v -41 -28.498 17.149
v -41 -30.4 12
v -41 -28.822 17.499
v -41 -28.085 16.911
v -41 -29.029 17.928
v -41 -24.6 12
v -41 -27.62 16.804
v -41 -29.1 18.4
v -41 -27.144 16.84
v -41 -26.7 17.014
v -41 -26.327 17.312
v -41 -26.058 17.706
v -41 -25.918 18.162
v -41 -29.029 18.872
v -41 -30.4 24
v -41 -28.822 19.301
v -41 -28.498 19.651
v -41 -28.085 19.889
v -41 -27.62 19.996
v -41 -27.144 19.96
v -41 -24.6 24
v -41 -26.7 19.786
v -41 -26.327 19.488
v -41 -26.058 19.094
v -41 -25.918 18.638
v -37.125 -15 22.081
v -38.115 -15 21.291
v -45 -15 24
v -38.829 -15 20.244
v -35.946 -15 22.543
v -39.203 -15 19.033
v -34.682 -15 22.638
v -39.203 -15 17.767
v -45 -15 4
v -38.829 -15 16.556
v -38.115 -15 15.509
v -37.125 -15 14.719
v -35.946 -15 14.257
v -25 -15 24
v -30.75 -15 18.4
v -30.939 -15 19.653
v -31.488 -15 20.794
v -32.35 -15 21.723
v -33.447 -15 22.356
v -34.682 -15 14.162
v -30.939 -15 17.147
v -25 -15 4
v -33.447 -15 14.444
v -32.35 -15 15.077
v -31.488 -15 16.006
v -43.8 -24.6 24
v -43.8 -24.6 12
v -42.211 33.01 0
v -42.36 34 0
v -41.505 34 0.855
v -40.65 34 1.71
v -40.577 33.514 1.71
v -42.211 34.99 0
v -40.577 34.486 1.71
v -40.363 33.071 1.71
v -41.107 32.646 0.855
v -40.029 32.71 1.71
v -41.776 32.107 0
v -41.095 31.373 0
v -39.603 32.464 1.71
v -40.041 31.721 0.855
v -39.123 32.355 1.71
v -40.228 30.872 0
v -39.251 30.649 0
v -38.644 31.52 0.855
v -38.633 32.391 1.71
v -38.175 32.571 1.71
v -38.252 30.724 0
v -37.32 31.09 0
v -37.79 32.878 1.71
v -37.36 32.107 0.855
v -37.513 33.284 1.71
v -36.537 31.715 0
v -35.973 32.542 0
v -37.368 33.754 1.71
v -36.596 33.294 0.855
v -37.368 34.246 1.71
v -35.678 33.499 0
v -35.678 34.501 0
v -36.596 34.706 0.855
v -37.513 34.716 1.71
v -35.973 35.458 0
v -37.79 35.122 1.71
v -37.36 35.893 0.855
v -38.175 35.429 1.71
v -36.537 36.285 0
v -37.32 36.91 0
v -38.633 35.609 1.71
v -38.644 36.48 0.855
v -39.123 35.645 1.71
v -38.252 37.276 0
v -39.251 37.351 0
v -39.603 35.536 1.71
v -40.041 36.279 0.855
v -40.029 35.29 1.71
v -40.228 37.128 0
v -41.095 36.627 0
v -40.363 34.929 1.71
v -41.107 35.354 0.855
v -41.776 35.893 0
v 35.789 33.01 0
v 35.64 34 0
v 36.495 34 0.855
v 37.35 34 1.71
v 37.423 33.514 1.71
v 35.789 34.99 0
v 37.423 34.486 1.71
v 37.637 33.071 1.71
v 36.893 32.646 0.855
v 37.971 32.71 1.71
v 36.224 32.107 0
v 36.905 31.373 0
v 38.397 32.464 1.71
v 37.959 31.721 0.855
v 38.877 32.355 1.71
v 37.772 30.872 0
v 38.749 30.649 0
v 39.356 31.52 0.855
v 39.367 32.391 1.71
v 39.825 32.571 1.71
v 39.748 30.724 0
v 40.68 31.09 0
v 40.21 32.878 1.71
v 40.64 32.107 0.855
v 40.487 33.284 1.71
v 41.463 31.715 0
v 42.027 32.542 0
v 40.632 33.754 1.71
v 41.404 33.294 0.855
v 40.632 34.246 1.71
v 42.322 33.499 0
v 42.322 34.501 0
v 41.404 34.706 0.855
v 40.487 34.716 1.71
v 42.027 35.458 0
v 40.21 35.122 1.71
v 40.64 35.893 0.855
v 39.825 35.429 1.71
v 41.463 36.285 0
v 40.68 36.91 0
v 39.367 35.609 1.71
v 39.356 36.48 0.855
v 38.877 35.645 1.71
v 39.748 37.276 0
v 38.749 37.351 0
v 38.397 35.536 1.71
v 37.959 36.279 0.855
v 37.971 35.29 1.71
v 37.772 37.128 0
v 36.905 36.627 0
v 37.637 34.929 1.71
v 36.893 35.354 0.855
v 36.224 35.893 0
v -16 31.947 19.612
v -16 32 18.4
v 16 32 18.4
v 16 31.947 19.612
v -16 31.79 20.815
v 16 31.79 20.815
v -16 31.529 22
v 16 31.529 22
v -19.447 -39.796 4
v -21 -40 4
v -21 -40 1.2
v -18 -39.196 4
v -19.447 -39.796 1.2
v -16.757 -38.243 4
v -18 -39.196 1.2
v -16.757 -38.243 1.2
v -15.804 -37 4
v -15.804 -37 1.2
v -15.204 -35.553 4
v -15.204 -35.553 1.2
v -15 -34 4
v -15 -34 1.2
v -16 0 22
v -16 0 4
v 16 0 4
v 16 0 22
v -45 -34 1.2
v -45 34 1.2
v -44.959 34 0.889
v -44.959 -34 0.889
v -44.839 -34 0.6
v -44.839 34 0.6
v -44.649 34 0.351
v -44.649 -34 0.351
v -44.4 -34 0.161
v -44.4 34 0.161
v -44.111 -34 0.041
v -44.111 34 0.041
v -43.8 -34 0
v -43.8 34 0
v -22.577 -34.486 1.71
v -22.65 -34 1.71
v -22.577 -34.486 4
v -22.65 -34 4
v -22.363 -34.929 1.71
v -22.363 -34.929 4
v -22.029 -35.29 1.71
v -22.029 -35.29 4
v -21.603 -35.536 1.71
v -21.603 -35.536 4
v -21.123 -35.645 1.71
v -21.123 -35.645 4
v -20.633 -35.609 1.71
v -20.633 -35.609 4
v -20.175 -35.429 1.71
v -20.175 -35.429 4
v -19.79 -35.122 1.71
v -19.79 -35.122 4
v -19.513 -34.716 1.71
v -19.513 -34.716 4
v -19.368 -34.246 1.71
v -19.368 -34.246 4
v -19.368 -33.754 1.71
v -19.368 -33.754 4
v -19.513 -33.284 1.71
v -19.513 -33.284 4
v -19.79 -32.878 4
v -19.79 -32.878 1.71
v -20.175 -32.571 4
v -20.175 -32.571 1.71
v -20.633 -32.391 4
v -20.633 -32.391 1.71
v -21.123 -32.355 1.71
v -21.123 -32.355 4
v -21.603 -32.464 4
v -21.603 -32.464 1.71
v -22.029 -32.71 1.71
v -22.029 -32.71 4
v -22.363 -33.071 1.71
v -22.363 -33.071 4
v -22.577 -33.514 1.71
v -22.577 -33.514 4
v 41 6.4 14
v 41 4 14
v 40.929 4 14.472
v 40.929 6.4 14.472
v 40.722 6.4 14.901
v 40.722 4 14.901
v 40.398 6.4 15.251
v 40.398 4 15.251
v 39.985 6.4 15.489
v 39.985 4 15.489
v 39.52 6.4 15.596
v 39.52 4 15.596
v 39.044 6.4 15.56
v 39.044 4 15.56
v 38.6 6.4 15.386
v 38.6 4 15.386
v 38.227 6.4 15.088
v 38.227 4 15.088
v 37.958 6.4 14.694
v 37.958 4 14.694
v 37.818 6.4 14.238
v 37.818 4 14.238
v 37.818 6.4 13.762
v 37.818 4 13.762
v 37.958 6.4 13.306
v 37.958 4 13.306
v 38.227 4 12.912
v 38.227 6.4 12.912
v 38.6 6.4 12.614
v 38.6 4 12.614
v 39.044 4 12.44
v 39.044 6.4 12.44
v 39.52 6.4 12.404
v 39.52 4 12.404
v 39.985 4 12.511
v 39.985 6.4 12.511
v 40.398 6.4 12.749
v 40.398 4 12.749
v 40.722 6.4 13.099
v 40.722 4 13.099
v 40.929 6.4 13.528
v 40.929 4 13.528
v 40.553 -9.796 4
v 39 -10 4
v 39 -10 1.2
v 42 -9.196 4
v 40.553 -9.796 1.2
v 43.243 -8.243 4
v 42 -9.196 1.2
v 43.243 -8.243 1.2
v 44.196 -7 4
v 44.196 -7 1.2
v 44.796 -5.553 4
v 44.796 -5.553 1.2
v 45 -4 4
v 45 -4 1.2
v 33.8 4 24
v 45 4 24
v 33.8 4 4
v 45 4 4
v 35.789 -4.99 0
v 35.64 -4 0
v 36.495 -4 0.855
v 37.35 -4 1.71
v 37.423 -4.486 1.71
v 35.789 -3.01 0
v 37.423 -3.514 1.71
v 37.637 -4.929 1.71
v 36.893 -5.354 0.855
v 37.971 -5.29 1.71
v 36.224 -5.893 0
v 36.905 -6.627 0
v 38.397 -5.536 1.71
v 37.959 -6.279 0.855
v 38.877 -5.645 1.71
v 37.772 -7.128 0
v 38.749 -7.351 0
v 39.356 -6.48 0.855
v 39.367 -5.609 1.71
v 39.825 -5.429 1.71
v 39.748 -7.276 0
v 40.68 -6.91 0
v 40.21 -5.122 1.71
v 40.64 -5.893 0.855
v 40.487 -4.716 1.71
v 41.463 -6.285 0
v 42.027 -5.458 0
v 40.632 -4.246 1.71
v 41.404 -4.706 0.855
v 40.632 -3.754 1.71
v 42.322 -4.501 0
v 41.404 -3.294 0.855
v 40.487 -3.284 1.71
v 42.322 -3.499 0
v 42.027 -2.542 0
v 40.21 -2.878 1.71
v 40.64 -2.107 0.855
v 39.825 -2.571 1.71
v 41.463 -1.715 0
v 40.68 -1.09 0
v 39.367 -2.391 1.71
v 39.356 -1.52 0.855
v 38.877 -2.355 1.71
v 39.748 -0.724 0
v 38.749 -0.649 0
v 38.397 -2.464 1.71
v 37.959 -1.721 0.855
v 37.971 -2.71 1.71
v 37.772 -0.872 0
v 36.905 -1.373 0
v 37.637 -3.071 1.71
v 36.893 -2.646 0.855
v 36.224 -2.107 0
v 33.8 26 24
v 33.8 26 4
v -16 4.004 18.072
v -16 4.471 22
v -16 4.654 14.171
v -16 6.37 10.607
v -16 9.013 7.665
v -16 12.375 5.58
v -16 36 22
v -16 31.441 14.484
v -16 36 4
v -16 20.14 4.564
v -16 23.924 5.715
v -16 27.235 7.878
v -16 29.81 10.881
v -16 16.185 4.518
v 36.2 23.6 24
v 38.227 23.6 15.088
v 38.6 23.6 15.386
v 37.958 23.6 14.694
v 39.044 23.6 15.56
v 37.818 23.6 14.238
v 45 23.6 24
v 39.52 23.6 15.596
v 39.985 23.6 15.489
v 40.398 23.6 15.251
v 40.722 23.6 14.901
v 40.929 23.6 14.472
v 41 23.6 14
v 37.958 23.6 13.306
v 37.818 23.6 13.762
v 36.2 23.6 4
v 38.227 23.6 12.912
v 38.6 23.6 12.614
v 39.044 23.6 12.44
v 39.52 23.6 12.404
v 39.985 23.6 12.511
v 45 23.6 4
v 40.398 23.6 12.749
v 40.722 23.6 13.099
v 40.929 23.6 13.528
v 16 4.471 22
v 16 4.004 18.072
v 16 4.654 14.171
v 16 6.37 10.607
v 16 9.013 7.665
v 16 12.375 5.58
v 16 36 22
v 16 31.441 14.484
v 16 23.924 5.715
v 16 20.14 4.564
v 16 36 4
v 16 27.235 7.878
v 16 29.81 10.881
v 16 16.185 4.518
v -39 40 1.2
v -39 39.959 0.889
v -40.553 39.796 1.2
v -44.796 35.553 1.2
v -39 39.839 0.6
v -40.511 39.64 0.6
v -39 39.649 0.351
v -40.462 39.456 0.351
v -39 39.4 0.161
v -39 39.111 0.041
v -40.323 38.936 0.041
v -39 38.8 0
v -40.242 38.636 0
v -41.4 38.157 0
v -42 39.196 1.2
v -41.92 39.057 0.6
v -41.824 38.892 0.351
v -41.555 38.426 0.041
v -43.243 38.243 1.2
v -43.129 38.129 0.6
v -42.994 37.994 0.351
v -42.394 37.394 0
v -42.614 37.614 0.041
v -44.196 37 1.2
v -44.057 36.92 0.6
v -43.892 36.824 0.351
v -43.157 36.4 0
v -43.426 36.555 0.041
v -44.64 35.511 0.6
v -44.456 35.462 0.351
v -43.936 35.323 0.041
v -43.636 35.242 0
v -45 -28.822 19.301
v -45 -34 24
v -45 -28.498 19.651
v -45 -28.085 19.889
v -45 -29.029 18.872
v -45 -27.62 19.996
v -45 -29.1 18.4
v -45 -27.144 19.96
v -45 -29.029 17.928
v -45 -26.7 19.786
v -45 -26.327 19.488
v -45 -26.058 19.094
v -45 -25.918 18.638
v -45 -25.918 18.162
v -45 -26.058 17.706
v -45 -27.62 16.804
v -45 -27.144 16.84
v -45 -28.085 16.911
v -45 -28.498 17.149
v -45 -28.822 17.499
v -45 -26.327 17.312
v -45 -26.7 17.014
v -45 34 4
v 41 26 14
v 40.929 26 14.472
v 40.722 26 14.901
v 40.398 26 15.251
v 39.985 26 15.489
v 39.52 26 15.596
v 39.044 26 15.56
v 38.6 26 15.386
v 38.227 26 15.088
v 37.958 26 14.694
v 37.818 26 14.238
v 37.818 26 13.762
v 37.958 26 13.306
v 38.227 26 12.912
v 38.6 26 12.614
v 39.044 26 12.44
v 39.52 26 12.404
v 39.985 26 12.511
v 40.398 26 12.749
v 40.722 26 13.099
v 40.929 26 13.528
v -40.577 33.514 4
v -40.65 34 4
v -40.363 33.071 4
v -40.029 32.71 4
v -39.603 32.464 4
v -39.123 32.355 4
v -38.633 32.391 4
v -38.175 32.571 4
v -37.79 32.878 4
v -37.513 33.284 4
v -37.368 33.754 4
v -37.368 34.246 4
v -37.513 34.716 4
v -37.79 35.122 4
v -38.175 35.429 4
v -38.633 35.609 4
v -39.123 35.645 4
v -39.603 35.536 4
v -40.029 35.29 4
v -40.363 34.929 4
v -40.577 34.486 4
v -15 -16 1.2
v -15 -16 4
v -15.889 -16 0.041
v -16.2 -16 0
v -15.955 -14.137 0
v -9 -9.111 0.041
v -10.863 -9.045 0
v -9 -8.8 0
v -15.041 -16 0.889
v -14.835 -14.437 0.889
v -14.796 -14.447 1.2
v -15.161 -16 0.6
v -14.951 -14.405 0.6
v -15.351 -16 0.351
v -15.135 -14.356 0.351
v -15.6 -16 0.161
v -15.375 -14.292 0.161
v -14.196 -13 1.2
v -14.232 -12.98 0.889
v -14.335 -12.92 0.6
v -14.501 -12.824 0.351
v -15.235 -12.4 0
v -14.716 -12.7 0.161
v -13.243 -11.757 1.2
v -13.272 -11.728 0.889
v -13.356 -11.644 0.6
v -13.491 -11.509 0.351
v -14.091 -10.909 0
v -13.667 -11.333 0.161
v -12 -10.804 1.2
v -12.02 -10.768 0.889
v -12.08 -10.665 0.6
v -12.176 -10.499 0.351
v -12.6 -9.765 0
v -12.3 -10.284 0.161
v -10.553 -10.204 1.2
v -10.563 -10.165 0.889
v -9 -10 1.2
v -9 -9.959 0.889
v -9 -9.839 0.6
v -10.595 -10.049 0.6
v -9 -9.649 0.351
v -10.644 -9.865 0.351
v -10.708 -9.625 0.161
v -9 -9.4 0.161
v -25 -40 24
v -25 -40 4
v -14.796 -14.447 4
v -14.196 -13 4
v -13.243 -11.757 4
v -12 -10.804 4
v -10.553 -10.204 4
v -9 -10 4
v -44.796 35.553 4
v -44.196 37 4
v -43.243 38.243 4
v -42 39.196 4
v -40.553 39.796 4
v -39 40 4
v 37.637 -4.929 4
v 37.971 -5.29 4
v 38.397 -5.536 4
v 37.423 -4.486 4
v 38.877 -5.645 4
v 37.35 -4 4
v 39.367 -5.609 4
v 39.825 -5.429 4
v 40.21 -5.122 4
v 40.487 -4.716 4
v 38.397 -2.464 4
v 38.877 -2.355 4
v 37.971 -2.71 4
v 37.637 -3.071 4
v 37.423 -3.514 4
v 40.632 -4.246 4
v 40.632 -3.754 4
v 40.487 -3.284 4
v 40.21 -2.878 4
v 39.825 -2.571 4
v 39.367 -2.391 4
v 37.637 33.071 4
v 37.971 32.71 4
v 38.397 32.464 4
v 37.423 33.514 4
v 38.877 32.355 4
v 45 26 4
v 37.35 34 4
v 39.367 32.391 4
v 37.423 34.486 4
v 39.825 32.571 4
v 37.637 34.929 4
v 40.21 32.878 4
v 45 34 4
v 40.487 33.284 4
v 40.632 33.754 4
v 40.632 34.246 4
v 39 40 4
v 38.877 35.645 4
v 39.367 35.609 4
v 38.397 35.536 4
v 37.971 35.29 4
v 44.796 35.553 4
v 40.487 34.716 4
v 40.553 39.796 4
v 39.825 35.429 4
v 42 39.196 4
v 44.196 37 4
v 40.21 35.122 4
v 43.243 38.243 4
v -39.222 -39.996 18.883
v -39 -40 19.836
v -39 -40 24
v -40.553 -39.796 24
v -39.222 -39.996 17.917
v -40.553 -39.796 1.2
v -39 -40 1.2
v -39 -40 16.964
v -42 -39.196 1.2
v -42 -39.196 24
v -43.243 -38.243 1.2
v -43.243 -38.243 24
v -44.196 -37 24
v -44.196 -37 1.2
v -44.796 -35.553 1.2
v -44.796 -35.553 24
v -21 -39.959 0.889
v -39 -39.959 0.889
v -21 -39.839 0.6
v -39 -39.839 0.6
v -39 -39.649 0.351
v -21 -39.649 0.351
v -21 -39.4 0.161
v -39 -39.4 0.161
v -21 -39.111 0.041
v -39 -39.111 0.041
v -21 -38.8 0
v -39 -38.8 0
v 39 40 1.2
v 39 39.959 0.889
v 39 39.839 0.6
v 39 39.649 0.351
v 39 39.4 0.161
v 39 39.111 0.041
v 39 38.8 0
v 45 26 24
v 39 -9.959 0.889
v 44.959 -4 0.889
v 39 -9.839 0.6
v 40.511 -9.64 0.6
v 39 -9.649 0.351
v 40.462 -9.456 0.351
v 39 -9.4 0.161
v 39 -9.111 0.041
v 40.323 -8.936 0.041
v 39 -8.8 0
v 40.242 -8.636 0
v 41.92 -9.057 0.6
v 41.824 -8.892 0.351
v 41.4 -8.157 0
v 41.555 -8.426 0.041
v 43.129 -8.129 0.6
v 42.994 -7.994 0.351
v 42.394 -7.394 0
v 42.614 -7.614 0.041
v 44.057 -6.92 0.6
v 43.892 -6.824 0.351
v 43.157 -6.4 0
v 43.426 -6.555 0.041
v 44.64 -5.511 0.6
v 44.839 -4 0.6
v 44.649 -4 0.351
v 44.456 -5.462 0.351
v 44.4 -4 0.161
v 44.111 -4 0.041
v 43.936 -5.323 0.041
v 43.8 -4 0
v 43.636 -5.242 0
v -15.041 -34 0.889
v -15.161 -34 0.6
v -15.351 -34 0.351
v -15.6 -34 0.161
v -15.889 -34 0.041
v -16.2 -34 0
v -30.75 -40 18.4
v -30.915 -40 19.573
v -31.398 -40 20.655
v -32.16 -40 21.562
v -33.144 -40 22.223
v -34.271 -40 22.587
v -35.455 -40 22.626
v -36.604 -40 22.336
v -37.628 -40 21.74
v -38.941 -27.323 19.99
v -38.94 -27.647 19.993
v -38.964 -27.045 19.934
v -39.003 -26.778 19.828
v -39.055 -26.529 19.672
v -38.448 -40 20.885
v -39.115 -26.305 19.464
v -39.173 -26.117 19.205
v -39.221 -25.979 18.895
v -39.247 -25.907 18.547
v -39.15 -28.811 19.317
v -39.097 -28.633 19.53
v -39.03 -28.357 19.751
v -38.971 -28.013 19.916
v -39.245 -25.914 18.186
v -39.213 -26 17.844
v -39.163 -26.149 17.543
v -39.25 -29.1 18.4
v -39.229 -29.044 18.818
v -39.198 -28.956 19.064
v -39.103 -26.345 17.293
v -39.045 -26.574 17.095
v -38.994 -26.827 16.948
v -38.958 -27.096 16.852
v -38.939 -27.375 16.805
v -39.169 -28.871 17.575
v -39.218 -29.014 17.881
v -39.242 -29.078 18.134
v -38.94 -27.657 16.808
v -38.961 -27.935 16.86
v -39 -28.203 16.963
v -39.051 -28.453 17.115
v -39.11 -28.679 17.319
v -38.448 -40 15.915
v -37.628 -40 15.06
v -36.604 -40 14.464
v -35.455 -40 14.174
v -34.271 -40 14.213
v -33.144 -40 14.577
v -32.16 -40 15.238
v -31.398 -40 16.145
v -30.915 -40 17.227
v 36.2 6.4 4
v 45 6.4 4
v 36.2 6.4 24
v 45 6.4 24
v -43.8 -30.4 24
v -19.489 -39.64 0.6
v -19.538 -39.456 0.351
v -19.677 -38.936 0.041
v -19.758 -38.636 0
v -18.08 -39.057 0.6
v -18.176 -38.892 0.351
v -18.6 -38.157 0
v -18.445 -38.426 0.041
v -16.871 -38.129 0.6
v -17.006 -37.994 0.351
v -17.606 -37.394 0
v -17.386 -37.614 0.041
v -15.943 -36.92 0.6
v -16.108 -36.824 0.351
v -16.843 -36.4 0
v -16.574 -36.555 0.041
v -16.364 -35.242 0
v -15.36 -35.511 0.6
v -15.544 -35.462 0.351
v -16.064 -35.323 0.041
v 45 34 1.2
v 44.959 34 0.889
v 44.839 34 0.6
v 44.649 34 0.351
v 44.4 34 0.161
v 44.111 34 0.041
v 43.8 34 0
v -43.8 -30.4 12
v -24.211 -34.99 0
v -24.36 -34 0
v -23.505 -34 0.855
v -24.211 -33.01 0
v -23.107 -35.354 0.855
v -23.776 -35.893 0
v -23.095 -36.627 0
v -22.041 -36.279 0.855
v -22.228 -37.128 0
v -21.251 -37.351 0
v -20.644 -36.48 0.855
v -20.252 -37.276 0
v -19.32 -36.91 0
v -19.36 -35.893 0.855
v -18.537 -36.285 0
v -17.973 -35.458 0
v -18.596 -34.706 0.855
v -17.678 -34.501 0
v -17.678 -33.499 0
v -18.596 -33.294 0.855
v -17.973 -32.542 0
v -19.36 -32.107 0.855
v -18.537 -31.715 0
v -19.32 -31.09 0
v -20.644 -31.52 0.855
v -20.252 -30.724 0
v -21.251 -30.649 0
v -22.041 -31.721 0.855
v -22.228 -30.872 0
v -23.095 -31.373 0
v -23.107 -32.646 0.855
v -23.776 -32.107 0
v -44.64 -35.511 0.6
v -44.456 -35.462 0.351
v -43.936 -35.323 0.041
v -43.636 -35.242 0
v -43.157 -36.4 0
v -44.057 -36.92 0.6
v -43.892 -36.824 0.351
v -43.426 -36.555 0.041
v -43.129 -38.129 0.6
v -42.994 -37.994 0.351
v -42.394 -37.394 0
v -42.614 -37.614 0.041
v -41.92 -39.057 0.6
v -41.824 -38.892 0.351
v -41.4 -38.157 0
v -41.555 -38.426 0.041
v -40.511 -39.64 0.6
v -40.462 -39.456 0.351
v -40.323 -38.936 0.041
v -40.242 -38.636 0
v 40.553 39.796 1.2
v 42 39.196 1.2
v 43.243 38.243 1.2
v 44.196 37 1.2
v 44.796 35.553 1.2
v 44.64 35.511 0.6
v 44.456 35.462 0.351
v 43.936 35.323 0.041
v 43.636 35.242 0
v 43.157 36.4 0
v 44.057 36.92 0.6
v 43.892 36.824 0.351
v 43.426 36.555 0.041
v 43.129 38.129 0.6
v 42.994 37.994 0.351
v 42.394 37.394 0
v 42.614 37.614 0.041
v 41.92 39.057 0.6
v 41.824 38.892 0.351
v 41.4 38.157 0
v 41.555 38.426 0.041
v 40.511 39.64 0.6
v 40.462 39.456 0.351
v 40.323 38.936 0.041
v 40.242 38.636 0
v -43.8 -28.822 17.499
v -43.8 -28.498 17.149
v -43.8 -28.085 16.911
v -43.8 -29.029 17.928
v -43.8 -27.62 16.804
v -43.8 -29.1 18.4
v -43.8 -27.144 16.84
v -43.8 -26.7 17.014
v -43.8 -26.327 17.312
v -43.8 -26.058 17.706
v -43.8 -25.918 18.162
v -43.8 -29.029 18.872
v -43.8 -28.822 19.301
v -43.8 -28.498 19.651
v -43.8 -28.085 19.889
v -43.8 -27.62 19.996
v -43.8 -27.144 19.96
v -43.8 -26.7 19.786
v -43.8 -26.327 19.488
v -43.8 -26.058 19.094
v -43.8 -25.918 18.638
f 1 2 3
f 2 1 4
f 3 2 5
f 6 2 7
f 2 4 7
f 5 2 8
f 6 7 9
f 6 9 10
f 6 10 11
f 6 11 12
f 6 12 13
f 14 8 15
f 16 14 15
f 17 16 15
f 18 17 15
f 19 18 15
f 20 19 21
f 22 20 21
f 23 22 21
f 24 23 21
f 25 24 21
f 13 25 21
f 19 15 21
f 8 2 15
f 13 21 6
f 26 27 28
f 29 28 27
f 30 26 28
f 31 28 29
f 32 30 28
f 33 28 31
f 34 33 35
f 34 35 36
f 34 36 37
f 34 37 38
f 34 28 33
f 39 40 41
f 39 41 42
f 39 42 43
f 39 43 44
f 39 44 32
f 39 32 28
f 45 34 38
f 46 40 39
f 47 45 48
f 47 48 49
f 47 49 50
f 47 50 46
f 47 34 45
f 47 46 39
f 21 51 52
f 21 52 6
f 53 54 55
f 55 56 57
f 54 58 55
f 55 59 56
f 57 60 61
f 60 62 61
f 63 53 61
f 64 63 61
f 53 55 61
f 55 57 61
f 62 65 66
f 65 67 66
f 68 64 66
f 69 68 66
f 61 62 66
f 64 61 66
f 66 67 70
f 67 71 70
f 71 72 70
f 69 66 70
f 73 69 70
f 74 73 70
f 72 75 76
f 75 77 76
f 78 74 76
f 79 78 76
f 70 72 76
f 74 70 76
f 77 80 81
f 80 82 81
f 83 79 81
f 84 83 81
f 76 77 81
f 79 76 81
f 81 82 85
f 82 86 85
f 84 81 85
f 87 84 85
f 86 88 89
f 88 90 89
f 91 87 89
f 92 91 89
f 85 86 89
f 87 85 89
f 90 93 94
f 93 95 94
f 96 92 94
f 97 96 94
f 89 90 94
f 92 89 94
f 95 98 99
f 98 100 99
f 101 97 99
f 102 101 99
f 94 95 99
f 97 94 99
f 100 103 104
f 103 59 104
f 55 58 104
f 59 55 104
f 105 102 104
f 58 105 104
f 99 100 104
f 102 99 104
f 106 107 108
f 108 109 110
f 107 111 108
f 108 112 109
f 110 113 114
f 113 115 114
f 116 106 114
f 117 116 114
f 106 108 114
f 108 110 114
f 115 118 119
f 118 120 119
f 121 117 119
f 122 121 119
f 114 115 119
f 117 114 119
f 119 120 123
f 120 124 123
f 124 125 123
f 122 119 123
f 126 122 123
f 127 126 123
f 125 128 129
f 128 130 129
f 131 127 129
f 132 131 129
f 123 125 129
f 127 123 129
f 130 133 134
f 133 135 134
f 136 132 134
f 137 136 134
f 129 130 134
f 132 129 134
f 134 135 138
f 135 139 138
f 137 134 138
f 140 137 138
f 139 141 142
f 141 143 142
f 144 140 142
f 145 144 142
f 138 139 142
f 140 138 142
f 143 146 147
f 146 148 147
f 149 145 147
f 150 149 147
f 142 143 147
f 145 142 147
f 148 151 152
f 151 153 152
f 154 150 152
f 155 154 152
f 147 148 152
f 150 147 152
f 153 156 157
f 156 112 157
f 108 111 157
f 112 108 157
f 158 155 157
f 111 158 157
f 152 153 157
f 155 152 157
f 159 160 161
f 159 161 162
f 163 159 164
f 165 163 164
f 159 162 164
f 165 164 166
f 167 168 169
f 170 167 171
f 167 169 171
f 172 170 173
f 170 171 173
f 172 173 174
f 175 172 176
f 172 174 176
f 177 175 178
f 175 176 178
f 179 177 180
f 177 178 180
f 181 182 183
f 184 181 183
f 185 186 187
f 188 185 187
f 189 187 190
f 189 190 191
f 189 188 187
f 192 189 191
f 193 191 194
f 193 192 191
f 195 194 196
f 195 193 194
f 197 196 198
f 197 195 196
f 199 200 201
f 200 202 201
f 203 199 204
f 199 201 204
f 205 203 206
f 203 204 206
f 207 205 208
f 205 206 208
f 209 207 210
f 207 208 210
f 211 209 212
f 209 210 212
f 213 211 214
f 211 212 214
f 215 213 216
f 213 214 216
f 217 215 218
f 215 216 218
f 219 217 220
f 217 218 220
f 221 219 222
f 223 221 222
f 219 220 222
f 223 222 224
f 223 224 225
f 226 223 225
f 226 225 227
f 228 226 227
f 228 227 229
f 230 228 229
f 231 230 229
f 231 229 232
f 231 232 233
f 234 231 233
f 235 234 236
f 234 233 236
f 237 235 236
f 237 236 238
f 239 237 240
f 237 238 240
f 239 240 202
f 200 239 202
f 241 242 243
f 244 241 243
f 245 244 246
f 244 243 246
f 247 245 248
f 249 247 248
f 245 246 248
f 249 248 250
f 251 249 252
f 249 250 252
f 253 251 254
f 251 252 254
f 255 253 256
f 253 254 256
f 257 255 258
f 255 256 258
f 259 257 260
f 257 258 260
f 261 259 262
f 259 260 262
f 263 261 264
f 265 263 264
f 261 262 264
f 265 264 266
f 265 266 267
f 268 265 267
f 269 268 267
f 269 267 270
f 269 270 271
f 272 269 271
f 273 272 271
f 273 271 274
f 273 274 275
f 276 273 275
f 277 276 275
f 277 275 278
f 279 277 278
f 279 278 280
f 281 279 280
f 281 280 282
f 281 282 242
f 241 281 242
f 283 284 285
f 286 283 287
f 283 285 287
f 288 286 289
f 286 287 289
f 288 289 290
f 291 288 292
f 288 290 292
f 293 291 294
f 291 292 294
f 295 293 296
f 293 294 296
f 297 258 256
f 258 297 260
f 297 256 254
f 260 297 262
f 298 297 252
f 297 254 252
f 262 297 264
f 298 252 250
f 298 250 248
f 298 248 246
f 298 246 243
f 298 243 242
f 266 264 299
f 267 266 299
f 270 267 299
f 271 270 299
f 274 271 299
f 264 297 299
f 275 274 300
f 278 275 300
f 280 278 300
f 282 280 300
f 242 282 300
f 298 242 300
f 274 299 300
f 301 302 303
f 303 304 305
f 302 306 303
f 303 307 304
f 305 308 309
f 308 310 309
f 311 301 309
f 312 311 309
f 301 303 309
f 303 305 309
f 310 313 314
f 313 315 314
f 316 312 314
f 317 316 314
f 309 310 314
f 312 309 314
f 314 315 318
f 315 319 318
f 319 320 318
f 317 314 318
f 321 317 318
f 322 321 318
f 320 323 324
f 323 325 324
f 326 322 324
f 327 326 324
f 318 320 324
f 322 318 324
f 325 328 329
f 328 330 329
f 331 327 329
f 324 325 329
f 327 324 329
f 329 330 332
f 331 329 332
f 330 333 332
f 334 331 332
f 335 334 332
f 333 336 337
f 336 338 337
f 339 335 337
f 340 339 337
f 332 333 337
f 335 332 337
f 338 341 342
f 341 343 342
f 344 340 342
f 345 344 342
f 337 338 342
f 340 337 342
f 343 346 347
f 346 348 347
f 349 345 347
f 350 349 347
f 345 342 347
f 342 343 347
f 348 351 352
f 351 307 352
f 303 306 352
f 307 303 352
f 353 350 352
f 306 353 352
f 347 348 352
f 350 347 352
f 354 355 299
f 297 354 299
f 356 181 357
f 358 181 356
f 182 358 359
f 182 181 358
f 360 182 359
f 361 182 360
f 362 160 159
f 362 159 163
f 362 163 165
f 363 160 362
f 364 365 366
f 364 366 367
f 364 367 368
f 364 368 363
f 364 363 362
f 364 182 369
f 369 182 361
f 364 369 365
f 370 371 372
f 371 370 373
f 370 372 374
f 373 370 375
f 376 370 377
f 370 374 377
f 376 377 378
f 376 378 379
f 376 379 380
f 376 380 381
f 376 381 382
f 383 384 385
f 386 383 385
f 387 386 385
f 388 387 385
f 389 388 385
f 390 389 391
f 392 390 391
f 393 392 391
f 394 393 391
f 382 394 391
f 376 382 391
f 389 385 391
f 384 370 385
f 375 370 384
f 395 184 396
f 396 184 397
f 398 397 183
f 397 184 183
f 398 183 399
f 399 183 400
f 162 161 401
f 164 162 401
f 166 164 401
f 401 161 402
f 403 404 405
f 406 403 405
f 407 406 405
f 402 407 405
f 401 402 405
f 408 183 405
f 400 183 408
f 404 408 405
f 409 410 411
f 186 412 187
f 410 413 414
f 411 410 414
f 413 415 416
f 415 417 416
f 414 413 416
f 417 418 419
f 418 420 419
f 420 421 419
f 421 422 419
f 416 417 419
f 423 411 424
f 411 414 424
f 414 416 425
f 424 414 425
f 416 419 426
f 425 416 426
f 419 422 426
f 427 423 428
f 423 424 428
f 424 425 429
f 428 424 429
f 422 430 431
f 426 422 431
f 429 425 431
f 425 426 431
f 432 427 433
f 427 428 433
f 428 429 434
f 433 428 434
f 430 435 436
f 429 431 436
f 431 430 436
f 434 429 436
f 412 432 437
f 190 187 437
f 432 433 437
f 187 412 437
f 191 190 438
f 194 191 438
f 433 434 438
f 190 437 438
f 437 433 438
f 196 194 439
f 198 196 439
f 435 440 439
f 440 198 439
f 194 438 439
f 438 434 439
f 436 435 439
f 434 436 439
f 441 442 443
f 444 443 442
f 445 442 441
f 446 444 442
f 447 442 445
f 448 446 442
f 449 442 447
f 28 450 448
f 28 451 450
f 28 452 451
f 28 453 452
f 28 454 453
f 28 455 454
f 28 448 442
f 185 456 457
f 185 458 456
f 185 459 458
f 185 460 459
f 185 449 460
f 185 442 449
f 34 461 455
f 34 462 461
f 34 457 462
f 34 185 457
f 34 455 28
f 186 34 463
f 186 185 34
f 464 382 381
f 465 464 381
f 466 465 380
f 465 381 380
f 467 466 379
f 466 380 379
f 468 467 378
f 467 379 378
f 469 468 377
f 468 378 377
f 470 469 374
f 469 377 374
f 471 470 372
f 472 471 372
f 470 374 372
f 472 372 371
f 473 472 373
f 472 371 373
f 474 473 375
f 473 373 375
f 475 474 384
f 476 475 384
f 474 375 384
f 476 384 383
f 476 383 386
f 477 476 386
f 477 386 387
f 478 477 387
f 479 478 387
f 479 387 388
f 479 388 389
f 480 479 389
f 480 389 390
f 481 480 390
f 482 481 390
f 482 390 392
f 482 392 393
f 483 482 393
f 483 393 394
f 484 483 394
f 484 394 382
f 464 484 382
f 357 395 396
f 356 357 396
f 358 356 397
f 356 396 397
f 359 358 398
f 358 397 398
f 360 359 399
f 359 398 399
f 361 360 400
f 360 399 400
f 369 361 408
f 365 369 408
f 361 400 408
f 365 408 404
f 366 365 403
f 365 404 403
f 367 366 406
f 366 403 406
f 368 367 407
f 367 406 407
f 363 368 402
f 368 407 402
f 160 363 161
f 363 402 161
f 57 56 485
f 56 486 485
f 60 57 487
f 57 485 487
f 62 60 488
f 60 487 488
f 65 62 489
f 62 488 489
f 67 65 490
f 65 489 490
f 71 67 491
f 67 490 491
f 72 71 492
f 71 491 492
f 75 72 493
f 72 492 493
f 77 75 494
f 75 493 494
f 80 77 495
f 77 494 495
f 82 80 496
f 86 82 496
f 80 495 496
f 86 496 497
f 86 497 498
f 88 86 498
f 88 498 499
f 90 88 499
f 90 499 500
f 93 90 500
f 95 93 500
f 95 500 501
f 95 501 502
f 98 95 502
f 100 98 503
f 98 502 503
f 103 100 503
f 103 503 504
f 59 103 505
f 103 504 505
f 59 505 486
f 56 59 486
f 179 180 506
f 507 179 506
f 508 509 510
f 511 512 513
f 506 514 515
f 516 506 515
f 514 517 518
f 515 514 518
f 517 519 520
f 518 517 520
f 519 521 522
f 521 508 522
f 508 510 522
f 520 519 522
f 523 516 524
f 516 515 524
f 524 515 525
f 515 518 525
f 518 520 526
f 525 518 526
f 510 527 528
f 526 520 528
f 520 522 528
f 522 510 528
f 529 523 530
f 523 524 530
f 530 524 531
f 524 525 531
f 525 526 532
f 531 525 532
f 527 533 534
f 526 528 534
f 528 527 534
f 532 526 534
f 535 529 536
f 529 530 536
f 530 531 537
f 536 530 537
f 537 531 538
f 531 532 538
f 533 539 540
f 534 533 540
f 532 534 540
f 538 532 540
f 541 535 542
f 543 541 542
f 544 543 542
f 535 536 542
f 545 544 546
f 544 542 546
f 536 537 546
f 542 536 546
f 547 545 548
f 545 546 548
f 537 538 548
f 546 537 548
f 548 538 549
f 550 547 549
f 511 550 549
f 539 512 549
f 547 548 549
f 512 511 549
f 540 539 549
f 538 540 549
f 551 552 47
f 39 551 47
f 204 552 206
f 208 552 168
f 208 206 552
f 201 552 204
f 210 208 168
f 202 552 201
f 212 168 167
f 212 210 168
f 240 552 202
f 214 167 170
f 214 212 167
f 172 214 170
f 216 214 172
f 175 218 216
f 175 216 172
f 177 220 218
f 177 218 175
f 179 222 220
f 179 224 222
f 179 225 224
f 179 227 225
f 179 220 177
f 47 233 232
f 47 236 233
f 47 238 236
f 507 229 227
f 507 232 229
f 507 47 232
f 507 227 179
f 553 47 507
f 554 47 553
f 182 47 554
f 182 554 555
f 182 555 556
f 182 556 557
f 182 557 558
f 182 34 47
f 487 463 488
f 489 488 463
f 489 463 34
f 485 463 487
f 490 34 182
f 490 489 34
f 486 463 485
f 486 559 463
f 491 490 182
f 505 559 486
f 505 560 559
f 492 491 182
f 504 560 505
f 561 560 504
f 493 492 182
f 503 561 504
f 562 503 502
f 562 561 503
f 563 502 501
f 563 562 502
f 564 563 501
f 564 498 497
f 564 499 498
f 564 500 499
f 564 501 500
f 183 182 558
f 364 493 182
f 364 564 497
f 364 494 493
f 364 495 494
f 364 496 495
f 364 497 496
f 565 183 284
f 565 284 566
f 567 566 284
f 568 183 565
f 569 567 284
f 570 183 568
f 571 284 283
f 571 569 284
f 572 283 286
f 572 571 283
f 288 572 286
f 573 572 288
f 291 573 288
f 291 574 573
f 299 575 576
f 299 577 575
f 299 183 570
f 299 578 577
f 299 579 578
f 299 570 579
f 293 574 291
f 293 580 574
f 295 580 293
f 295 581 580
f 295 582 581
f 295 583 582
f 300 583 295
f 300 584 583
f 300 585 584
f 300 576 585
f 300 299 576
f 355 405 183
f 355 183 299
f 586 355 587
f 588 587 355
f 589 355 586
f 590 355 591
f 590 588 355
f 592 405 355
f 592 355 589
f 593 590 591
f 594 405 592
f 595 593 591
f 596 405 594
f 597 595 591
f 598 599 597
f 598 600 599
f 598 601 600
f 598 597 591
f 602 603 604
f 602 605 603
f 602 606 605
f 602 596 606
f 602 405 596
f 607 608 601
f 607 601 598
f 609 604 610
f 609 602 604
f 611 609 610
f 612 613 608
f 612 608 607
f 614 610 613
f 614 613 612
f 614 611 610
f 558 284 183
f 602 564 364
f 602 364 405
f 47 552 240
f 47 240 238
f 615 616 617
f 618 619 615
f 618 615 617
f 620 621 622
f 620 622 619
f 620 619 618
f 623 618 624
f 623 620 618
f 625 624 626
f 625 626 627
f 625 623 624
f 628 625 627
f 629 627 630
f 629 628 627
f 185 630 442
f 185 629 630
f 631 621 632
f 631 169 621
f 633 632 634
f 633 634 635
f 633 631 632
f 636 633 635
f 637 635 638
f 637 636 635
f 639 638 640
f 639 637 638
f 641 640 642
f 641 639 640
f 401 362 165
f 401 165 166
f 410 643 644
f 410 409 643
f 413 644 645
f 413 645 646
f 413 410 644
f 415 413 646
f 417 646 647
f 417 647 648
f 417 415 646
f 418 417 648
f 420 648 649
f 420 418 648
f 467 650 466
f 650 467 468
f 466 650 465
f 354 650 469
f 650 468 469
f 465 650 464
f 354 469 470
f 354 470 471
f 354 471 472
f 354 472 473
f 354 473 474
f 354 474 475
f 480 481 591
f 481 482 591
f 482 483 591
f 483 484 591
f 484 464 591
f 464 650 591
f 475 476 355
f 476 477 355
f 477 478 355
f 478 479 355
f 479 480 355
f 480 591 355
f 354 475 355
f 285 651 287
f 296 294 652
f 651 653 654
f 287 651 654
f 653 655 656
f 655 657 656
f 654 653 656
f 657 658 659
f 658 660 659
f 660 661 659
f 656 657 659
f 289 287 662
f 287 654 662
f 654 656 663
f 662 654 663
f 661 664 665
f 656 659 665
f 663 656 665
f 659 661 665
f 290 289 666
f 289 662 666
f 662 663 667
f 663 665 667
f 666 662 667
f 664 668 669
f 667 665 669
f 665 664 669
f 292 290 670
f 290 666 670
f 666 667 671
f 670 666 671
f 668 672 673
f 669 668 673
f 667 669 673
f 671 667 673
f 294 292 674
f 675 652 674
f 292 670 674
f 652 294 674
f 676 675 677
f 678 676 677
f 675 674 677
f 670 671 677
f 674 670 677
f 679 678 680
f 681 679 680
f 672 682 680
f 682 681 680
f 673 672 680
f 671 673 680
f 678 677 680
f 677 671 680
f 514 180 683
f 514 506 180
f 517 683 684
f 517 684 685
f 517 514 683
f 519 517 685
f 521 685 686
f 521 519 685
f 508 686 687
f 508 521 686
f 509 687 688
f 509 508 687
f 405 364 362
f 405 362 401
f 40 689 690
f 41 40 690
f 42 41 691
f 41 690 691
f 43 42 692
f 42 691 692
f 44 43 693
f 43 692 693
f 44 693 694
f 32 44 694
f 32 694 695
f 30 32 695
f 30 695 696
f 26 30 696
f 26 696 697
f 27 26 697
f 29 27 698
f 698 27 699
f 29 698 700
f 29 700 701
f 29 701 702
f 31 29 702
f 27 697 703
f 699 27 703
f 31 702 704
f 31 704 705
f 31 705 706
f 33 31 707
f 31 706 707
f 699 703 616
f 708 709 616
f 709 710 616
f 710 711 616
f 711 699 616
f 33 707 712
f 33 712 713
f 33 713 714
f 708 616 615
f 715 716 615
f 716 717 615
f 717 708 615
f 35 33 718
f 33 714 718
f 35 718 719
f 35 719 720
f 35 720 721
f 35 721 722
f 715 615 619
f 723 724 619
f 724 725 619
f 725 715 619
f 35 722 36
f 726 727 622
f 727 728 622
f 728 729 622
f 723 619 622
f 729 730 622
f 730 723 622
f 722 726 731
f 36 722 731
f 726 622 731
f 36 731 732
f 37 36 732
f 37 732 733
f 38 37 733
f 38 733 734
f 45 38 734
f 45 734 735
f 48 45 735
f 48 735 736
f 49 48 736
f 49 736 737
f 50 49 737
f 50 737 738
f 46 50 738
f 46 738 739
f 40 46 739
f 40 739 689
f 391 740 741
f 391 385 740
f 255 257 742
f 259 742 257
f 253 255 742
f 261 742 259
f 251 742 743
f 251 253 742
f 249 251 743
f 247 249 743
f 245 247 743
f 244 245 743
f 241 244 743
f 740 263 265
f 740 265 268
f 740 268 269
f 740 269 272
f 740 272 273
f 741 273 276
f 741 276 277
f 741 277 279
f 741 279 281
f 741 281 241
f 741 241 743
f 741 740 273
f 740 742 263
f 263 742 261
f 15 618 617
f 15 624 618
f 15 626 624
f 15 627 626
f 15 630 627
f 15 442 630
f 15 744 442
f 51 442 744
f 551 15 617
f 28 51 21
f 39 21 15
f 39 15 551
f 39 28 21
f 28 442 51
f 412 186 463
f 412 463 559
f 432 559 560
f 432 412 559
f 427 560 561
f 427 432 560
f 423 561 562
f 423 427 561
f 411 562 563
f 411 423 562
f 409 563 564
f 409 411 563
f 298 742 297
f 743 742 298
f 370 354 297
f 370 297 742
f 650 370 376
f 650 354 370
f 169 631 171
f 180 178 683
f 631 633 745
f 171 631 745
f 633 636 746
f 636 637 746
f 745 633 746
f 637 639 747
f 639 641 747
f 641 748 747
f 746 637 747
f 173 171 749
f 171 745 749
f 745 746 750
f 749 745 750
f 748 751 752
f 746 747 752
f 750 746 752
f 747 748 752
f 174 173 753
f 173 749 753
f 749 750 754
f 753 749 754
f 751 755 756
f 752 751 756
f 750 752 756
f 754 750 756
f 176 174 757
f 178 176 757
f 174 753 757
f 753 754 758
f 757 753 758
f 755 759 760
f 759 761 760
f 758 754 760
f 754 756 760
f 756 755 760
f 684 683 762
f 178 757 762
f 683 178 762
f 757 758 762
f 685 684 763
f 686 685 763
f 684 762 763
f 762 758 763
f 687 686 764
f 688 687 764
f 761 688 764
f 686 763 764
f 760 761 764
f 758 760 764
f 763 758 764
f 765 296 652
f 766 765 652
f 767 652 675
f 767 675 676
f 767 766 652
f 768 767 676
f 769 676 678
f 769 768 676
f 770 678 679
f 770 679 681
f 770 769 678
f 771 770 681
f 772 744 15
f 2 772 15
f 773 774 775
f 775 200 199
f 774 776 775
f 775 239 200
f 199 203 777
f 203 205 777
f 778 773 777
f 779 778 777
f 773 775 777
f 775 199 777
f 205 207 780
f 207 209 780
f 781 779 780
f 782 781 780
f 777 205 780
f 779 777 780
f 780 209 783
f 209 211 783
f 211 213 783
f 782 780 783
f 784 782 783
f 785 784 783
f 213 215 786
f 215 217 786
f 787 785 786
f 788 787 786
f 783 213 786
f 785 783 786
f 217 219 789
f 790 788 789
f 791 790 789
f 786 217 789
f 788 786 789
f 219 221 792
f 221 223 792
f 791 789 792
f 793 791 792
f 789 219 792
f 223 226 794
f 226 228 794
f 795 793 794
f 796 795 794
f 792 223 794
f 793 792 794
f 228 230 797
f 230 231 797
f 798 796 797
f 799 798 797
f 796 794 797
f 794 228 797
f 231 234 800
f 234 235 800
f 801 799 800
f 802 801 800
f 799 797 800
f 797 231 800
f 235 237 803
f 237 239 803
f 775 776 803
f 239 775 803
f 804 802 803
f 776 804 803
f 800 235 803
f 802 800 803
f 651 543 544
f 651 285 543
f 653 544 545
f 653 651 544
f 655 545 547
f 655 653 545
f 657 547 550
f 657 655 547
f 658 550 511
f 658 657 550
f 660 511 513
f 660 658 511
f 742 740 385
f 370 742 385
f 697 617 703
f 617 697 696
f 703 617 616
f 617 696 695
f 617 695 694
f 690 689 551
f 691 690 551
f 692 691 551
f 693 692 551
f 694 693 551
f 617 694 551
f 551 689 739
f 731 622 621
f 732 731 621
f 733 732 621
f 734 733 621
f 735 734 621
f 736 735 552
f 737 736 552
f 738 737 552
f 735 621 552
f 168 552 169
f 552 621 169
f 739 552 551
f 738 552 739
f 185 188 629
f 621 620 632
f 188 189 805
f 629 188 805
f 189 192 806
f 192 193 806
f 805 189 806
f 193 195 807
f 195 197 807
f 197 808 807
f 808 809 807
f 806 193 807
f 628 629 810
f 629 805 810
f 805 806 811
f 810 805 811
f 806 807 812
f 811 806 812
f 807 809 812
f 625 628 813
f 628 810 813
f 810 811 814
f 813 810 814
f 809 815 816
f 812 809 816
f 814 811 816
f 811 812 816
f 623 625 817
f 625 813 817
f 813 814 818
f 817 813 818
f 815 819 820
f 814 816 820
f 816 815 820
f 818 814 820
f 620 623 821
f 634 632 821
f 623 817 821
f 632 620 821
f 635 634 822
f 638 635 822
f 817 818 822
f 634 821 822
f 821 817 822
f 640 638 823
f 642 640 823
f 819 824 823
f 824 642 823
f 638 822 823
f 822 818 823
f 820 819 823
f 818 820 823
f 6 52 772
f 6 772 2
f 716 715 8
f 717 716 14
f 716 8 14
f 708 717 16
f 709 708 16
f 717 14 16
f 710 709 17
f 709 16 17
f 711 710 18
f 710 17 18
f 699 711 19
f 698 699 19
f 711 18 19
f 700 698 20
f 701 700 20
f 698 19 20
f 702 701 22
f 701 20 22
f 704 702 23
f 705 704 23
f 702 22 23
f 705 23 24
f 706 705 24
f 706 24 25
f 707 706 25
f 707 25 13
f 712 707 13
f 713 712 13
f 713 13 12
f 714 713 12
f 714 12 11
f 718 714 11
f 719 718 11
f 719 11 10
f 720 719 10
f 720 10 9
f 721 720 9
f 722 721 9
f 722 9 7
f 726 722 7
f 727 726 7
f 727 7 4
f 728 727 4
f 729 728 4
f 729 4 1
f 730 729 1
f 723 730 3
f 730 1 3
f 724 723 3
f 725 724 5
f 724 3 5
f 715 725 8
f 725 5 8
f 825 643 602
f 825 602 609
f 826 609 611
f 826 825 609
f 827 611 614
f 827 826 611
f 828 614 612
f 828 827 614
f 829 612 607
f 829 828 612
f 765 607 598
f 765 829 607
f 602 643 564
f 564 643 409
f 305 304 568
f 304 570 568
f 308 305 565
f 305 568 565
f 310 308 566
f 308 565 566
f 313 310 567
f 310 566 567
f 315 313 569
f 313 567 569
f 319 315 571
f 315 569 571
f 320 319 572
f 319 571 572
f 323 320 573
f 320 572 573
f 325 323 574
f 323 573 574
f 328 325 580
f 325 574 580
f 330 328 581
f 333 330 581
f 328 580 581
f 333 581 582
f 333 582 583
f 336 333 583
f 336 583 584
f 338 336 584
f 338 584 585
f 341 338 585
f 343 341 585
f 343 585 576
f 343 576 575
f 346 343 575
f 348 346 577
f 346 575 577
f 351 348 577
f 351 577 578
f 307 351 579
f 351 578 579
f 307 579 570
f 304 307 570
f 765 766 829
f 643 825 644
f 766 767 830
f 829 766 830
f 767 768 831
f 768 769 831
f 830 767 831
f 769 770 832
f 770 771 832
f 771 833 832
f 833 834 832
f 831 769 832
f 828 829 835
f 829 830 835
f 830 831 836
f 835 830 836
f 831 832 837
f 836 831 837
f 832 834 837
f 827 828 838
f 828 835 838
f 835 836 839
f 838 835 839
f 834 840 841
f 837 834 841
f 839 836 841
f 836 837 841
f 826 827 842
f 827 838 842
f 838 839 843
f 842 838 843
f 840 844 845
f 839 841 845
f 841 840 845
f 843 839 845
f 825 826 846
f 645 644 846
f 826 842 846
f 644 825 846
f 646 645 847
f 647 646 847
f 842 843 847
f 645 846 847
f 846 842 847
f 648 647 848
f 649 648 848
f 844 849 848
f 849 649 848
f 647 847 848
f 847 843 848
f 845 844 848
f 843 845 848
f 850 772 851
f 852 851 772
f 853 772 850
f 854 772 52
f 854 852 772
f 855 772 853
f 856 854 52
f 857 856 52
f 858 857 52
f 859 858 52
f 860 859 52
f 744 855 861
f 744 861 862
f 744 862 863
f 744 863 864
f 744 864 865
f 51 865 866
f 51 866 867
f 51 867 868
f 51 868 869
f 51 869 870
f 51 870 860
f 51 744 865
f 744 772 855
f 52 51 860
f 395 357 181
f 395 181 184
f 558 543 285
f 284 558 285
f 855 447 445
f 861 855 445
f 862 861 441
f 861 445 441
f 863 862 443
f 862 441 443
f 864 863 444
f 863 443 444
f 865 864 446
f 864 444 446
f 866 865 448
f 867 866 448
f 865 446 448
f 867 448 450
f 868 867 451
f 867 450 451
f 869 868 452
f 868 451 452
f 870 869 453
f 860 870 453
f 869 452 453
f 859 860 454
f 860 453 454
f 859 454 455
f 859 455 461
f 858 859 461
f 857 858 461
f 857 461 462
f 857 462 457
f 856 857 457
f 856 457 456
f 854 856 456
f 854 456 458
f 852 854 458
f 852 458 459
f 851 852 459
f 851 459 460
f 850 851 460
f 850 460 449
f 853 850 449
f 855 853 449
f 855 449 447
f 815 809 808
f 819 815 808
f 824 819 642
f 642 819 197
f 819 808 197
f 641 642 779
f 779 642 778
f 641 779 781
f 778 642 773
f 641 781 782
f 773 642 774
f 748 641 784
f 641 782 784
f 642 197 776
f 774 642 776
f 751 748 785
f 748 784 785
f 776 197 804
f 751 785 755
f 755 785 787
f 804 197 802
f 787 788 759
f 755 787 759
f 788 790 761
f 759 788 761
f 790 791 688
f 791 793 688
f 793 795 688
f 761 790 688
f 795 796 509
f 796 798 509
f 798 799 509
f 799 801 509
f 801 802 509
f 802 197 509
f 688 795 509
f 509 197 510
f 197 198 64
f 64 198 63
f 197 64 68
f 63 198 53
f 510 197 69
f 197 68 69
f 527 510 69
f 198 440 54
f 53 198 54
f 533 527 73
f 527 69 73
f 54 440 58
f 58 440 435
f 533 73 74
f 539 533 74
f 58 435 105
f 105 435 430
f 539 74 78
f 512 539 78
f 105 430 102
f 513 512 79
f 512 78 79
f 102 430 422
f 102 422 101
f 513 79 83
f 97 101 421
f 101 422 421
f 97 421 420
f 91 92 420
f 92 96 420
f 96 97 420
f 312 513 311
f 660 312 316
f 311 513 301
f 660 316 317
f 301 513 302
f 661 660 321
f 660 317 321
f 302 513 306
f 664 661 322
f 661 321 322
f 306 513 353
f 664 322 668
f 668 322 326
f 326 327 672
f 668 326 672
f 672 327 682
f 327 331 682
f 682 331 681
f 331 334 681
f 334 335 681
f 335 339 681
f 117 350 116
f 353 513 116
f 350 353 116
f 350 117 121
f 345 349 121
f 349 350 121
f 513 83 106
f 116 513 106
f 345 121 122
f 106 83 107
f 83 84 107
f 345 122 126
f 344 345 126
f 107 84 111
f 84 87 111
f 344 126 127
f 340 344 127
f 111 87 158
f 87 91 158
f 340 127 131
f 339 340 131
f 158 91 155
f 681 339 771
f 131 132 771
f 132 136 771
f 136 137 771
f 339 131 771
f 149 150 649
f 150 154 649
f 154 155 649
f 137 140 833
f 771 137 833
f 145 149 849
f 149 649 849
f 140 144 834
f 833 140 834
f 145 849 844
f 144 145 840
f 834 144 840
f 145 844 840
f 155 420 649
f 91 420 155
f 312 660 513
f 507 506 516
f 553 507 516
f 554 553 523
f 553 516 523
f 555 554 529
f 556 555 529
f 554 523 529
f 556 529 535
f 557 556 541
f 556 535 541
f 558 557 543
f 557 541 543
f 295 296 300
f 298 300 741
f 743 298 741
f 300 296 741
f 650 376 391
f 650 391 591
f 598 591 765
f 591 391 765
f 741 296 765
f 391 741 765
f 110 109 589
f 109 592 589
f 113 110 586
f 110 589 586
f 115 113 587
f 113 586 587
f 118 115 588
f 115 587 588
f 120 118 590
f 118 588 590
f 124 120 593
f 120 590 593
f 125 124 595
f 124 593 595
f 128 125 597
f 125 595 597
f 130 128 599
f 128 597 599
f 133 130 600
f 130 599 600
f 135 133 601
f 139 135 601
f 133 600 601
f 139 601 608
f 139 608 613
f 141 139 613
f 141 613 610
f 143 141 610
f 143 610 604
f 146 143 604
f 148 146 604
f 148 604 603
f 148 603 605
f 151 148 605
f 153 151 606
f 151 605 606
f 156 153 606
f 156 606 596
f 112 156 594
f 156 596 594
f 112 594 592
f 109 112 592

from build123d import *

# Parameters (mm, degrees)
F1_DEPTH        = 4
F2_W            = 32
F2_H            = 36
F3_DEPTH        = 18
F5_DEPTH        = 32
F2_W_2          = 20
F2_H_2          = 25
F6_DEPTH        = 20
F7_R            = 4.25
F8_DEPTH        = 25
F9_W            = 2.8
F9_H            = 5.8
F10_DEPTH       = 12
F11_R           = 1.6
F12_DEPTH       = 10
F13_T1_DEPTH    = 4
F13_T3_DEPTH    = 34
F13_T5_DEPTH    = 54
F2_W_3          = 8.8
F2_H_3          = 2.4
F14_DEPTH       = 20
F15_R           = 1.6
F16_DEPTH       = 22
F18_D           = 3.3
F18_CSINK_D     = 6.72
F18_CSINK_ANGLE = 90
F19_R           = 1.2


# Not quite as in the source:
# - a fillet or chamfer that OpenCascade refuses, or shapes differently, is made with other operations: its cross-section is extruded or revolved along the edge and cut away or added


with BuildPart() as f1:
    # F0 (on Top) → F1 (new body)
    with BuildSketch(Plane.XY):
        Polygon((-45, -40), (-15, -40), (-15, -10), (45, -10), (45, 40), (-45, 40), align=None)
    extrude(amount=F1_DEPTH)

    # F2 (on face) → F3 (join)
    with BuildSketch(Plane.XY.offset(4)):
        with Locations((0, 18)):
            Rectangle(F2_W, F2_H)
    extrude(amount=F3_DEPTH)

    # F4 (on face) → F5 (cut, through all)
    with BuildSketch(Plane.YZ.offset(16)):
        with BuildLine():
            ThreePointArc((4.4707723798, 22), (16.1846745035, 4.5181920003), (32, 18.4))
            ThreePointArc((32, 18.4), (31.8818079997, 20.2153254965), (31.5292276202, 22))
            Line((31.5292276202, 22), (4.4707723798, 22))
        make_face()
    extrude(amount=-F5_DEPTH, mode=Mode.SUBTRACT)

    # F2 (on face) → F6 (join)
    with BuildSketch(Plane.XY.offset(4)):
        with Locations((-35, -27.5)):
            Rectangle(F2_W_2, F2_H_2)
    extrude(amount=F6_DEPTH)

    # F7 (on face) → F8 (cut, through all)
    with BuildSketch(Plane.XZ.offset(40)):
        with Locations((-35, 18.4)):
            Circle(F7_R)
    extrude(amount=-F8_DEPTH, mode=Mode.SUBTRACT)

    # F9 (on face) → F10 (cut)
    with BuildSketch(Plane.XY.offset(24)):
        with Locations((-42.4, -27.5)):
            Rectangle(F9_W, F9_H)
    extrude(amount=-F10_DEPTH, mode=Mode.SUBTRACT)

    # F11 (on face) → F12 (cut)
    with BuildSketch(Plane(origin=(-45, 0, 0), x_dir=(0, -1, 0), z_dir=(-1, 0, 0))):
        with Locations((27.5, 18.4)):
            Circle(F11_R)
    extrude(amount=-F12_DEPTH, mode=Mode.SUBTRACT)

    # F13: fillet of radius 6 on 6 edges, made by hand

    # F13_s2 → F13_t1 (join)
    with BuildSketch(Plane.XY):
        with BuildLine():
            ThreePointArc((-15, -16), (-13.2426406871, -11.7573593129), (-9, -10))
            Line((-9, -10), (-15, -10))
            Line((-15, -10), (-15, -16))
        make_face()
    extrude(amount=F13_T1_DEPTH)

    # F13_s4 → F13_t3 (cut)
    with BuildSketch(Plane.XY.offset(-15)):
        with BuildLine():
            ThreePointArc((-21, -40), (-16.7573593129, -38.2426406871), (-15, -34))
            Line((-15, -34), (-15, -40))
            Line((-15, -40), (-21, -40))
        make_face()
        with BuildLine():
            ThreePointArc((39, -10), (43.2426406871, -8.2426406871), (45, -4))
            Line((45, -4), (45, -10))
            Line((45, -10), (39, -10))
        make_face()
        with BuildLine():
            ThreePointArc((39, 40), (43.2426406871, 38.2426406871), (45, 34))
            Line((45, 34), (45, 40))
            Line((45, 40), (39, 40))
        make_face()
        with BuildLine():
            ThreePointArc((-45, 34), (-43.2426406871, 38.2426406871), (-39, 40))
            Line((-39, 40), (-45, 40))
            Line((-45, 40), (-45, 34))
        make_face()
    extrude(amount=F13_T3_DEPTH, mode=Mode.SUBTRACT)

    # F13_s6 → F13_t5 (cut)
    with BuildSketch(Plane.XY.offset(-15)):
        with BuildLine():
            ThreePointArc((-39, -40), (-43.2426406871, -38.2426406871), (-45, -34))
            Line((-45, -34), (-45, -40))
            Line((-45, -40), (-39, -40))
        make_face()
    extrude(amount=F13_T5_DEPTH, mode=Mode.SUBTRACT)

    # F2 (on face) → F14 (join)
    with BuildSketch(Plane.XY.offset(4)):
        Polygon((36.2, 23.6), (36.2, 26), (33.8, 26), (33.8, 4), (36.2, 4), (36.2, 6.4), align=None)
        with Locations((40.6, 5.2)):
            Rectangle(F2_W_3, F2_H_3)
        with Locations((40.6, 24.8)):
            Rectangle(F2_W_3, F2_H_3)
    extrude(amount=F14_DEPTH)

    # F15 (on face) → F16 (cut, through all)
    with BuildSketch(Plane.XZ.offset(-4)):
        with Locations((39.4, 14)):
            Circle(F15_R)
    extrude(amount=-F16_DEPTH, mode=Mode.SUBTRACT)

    # F18 (through all)
    with Locations(Plane(origin=(0, 0, 0), x_dir=(1, 0, 0), z_dir=(0, 0, -1))):
        with Locations((-21, 34), (39, 4), (39, -34), (-39, -34)):
            CounterSinkHole(F18_D / 2, F18_CSINK_D / 2, counter_sink_angle=F18_CSINK_ANGLE)

    # F19
    f19_edges = [f1.edges().sort_by_distance(p)[0] for p in [
        (0, 40, 0),
        (-43.242641, 38.242641, 0),
        (-30, -40, 0),
        (-43.242641, -38.242641, 0),
        (-45, 0, 0),
        (43.242641, 38.242641, 0),
        (45, 15, 0),
        (-16.757359, -38.242641, 0),
        (43.242641, -8.242641, 0),
        (-15, -25, 0),
        (15, -10, 0),
        (-13.242641, -11.757359, 0),
    ]]
    fillet(f19_edges, radius=F19_R)


solid = f1.part
